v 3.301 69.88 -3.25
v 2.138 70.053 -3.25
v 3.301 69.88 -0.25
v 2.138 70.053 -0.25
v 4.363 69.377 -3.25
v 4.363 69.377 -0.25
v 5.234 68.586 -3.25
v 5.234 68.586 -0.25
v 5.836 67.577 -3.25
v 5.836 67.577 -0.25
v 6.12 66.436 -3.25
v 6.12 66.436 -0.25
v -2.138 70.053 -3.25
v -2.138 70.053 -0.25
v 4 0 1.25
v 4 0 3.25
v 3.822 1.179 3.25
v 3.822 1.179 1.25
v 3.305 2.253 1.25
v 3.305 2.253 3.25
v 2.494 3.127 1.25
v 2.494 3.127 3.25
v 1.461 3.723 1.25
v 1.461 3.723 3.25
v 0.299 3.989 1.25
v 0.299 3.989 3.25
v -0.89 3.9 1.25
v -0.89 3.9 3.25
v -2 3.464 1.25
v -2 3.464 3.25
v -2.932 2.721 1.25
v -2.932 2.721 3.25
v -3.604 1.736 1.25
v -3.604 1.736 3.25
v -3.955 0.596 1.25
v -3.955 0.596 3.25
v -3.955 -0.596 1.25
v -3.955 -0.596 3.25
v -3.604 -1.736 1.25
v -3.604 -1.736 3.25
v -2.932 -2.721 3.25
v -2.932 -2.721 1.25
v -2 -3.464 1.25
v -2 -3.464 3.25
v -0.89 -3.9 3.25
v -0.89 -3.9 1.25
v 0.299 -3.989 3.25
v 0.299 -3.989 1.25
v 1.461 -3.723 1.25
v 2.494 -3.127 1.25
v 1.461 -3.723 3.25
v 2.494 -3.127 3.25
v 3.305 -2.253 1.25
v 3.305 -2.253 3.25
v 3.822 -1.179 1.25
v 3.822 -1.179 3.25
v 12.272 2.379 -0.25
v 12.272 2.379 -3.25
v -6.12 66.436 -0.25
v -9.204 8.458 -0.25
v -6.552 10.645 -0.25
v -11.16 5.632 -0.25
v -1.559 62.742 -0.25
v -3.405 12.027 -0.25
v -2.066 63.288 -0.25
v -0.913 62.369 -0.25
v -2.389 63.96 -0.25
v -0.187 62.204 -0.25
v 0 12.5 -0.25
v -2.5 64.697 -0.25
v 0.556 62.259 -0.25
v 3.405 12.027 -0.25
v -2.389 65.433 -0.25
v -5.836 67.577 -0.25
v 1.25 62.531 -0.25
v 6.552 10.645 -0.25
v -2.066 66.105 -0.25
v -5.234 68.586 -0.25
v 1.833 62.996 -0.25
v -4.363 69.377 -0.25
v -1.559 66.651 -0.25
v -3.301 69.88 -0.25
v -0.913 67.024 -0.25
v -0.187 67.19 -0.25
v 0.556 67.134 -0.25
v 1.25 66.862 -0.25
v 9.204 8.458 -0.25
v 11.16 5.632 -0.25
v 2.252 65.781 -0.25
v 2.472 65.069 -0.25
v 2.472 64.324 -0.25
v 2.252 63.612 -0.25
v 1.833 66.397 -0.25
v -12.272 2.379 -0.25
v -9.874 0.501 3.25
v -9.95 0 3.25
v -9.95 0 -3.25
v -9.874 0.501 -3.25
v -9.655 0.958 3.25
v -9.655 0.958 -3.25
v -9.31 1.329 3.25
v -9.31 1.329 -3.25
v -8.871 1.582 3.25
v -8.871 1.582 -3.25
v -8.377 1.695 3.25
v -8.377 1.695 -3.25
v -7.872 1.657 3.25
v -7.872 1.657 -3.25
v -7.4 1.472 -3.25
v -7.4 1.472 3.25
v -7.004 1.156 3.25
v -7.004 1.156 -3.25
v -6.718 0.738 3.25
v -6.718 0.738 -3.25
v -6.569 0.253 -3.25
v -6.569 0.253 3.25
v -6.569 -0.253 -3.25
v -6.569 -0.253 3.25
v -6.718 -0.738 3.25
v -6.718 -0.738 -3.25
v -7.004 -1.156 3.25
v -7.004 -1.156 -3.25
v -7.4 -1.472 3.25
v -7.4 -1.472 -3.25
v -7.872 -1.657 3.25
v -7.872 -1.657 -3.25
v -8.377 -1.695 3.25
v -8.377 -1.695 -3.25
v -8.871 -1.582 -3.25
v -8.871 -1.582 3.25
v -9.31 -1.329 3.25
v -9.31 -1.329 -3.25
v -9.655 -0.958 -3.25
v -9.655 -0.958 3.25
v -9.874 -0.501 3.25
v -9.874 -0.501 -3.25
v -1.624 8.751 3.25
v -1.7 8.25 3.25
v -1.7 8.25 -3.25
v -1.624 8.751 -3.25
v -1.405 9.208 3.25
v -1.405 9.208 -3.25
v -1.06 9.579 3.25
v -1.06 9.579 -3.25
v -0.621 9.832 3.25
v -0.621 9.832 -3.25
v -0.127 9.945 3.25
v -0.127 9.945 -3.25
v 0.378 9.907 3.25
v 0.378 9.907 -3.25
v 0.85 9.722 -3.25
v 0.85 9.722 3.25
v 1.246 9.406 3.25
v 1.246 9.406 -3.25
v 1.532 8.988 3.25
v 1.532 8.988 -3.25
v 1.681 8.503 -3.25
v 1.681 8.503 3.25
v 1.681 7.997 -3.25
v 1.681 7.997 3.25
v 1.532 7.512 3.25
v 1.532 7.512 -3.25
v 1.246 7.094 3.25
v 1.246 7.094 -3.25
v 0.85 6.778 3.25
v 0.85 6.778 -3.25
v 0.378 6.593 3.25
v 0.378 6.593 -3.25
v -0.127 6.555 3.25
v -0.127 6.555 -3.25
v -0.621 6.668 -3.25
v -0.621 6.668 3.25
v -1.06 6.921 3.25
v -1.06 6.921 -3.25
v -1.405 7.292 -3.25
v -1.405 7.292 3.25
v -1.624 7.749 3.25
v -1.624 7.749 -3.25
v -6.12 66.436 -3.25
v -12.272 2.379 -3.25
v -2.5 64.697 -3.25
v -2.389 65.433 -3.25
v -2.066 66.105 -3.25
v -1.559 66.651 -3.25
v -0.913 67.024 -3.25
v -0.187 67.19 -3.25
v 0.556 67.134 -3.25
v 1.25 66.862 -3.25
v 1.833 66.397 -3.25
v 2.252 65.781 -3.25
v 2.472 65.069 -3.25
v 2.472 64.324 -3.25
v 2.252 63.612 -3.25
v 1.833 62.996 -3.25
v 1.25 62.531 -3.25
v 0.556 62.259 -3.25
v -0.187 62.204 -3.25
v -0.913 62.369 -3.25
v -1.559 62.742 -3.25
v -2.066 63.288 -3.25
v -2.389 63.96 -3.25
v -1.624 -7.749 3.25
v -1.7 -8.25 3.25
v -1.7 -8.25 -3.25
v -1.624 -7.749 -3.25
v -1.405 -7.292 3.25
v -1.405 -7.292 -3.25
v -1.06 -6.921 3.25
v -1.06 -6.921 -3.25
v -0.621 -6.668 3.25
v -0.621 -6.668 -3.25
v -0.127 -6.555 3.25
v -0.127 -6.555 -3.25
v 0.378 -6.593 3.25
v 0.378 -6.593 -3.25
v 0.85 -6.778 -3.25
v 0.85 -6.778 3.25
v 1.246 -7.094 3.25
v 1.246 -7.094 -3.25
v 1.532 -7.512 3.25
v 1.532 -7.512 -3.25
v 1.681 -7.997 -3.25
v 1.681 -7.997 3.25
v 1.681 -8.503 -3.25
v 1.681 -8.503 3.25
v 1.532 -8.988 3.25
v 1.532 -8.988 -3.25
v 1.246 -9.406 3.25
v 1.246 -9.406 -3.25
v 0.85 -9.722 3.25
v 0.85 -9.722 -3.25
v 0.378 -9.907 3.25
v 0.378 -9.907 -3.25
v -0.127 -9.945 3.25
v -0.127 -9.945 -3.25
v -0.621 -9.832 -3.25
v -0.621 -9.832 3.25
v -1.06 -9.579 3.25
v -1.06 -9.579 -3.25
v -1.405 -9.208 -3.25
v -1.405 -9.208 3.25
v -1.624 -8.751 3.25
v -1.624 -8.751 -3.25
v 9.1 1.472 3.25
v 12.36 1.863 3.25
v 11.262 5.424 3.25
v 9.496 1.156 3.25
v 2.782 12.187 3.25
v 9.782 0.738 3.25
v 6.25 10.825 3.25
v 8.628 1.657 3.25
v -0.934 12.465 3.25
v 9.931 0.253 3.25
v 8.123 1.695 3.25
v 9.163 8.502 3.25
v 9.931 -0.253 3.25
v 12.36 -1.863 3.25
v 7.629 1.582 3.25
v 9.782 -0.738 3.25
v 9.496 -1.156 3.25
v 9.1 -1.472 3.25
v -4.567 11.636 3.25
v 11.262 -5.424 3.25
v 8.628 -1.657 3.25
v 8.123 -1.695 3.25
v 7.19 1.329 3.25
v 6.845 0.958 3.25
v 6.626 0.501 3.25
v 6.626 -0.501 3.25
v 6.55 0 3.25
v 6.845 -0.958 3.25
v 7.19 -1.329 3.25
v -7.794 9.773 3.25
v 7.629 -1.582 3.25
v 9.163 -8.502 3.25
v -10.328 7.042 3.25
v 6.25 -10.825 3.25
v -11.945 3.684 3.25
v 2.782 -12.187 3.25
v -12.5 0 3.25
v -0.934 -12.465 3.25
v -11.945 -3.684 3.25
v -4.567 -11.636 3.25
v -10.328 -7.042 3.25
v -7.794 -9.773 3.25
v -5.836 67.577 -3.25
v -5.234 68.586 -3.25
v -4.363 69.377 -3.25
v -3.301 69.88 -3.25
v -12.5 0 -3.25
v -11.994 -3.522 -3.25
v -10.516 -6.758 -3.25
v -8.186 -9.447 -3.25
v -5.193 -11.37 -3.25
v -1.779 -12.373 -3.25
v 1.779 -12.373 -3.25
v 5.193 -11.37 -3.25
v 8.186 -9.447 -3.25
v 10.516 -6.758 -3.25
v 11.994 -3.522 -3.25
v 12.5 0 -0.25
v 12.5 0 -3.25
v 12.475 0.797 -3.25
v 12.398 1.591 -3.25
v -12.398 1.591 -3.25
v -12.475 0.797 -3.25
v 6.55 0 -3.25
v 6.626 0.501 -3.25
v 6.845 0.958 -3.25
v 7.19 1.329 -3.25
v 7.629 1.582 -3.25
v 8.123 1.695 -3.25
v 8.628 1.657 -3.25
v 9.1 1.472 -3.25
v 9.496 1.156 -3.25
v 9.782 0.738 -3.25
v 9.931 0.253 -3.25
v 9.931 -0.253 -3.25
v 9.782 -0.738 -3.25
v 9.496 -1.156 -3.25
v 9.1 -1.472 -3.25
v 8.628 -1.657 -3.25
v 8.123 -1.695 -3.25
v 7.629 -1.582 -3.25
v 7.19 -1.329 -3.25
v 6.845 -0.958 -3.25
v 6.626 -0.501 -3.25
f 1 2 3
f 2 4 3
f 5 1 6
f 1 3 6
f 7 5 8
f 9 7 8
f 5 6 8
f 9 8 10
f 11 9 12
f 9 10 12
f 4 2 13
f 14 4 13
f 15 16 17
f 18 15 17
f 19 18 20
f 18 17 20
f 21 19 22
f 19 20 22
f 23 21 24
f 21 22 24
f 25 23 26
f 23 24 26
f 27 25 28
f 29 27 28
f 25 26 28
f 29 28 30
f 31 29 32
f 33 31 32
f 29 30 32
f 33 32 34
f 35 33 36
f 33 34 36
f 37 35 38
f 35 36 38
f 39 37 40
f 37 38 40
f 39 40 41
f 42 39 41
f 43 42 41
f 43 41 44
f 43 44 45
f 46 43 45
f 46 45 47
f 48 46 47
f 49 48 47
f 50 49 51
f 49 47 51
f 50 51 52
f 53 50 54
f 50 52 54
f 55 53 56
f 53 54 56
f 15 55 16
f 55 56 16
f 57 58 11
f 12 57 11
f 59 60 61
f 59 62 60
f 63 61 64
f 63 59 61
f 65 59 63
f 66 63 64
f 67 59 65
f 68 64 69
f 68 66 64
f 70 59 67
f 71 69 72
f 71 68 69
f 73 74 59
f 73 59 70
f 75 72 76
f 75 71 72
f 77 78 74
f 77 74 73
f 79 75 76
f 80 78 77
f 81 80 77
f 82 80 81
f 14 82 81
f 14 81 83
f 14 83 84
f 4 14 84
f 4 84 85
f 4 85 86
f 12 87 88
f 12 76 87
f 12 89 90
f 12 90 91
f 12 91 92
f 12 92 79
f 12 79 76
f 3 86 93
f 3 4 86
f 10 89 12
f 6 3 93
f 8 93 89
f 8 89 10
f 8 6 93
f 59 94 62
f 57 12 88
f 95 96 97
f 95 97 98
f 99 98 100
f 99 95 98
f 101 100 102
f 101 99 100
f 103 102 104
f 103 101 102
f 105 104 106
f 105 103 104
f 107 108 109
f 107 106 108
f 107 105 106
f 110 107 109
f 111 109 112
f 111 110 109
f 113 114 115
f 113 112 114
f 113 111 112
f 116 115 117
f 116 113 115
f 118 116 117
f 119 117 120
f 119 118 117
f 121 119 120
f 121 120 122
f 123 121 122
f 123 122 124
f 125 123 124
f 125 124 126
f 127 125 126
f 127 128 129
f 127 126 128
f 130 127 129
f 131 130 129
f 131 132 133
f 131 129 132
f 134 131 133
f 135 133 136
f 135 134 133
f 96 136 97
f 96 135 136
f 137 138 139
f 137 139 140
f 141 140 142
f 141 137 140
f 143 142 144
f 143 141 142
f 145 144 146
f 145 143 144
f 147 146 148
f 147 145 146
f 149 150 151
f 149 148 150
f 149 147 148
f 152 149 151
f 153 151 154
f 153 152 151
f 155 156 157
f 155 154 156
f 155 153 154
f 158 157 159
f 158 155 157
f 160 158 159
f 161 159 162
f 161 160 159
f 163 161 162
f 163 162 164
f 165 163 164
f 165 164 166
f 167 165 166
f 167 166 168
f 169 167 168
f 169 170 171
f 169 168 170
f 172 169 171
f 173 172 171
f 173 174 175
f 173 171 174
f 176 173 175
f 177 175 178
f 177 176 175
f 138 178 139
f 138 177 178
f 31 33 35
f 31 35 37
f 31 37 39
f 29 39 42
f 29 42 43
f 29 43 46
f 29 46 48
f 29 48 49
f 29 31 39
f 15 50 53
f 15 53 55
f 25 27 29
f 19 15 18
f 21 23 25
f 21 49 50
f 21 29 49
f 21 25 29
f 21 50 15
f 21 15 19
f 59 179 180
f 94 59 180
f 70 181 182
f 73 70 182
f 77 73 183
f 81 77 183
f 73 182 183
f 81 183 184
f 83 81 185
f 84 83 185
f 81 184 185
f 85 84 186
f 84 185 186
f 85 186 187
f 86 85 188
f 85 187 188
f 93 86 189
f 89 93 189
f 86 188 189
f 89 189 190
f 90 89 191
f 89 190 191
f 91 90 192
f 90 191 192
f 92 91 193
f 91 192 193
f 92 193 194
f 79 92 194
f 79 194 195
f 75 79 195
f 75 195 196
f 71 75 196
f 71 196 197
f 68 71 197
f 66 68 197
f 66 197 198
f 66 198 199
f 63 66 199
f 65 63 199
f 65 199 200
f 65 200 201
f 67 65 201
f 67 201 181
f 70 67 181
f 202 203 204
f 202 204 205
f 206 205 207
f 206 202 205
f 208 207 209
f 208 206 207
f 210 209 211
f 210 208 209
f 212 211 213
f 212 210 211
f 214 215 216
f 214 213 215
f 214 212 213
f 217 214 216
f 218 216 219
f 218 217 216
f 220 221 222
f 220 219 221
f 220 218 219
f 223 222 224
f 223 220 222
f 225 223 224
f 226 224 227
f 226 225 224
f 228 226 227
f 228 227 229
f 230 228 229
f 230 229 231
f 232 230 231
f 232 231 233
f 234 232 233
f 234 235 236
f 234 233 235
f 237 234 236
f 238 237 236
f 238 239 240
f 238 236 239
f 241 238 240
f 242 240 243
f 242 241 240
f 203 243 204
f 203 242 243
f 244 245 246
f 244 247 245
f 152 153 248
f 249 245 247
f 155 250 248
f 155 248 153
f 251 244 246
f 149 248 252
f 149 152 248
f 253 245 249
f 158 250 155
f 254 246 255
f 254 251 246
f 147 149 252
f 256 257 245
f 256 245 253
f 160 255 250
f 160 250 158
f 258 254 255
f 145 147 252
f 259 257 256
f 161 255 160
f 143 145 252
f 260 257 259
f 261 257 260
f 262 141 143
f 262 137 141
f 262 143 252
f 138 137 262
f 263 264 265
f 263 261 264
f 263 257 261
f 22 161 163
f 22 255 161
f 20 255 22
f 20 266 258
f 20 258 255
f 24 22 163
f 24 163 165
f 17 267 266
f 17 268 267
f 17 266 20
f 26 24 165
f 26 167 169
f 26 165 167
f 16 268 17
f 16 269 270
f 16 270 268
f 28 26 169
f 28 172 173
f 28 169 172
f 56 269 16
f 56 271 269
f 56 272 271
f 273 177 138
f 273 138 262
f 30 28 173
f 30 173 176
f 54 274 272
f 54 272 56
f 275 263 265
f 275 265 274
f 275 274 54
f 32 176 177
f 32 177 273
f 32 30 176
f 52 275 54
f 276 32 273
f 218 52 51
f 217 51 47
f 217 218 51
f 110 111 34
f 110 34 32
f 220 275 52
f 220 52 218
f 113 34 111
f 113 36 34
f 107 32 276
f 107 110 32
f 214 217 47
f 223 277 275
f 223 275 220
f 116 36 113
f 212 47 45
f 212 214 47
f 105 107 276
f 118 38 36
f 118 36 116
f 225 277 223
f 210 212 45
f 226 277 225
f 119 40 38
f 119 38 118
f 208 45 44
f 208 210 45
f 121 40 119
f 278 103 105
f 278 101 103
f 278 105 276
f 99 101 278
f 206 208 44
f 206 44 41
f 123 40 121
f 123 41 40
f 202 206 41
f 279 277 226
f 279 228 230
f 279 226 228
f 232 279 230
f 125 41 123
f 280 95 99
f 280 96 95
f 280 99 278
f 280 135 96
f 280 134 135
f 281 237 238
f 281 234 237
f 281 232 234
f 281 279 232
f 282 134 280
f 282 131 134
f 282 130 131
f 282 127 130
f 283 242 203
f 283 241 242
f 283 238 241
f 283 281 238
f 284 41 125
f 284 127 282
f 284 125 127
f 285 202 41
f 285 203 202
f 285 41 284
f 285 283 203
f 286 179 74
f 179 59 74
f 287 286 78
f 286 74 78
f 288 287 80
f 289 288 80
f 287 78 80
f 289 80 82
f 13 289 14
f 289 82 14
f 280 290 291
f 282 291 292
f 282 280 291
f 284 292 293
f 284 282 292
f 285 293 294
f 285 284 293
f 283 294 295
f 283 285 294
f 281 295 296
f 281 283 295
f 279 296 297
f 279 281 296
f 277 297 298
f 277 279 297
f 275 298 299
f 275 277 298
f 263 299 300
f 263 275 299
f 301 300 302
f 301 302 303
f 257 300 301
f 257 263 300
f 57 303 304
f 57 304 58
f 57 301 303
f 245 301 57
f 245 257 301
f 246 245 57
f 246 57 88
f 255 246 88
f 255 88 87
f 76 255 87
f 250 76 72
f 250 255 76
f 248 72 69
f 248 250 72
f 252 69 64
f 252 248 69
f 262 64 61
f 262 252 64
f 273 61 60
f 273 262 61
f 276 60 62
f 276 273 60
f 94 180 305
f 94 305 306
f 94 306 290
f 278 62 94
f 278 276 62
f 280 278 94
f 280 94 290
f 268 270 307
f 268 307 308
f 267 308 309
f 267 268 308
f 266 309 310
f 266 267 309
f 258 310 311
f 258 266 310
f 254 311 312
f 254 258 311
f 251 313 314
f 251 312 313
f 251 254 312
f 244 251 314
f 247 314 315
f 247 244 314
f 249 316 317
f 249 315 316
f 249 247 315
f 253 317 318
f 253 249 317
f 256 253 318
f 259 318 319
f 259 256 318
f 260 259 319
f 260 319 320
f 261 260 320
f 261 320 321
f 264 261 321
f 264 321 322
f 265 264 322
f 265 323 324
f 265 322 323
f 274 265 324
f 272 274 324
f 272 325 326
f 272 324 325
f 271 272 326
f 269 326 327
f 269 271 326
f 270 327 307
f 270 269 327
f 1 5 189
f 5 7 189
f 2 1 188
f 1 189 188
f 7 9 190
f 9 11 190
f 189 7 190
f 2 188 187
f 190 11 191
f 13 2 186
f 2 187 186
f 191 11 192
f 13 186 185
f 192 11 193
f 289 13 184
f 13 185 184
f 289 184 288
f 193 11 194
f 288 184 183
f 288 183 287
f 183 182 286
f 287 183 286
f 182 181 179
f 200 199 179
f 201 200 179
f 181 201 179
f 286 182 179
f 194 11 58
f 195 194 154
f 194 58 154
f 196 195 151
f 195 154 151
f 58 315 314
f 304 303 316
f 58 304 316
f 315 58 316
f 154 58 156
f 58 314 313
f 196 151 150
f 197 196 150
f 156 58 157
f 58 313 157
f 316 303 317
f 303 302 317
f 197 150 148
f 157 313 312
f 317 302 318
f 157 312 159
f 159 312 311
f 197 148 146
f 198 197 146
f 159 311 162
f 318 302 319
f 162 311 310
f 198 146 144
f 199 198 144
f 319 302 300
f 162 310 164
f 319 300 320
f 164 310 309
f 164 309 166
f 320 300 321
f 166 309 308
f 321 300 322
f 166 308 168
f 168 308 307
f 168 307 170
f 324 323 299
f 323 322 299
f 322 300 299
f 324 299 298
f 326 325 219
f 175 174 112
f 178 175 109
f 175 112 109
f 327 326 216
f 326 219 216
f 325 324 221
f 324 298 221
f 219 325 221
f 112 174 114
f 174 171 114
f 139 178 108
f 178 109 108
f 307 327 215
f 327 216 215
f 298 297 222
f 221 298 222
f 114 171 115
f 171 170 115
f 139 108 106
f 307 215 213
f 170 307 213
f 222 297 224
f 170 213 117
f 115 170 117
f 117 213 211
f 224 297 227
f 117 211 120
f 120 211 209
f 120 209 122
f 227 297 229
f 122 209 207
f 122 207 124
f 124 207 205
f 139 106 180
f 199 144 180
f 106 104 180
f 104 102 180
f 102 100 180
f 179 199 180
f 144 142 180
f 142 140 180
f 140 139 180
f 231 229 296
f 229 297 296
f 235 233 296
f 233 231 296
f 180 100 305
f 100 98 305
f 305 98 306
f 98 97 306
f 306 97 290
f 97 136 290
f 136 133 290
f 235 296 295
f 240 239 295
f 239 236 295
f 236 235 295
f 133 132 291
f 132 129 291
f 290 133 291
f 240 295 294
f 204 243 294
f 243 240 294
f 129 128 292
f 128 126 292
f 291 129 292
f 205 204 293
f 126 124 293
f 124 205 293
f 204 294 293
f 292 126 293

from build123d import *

# Parameters (mm, degrees)
ESQUISSE2_R                  = 12.5
BOSS_EXTRU_1_DEPTH           = 3.25
ESQUISSE3_R                  = 1.2
ENL_V_MAT_EXTRU_1_DEPTH      = 18.973939468
BOSS_EXTRU_2_DEPTH           = 3
ENL_V_MAT_EXTRU_2_DEPTH      = 72.455982989
ENL_V_MAT_EXTRU_2_DEPTH_BACK = 72.455982989
ESQUISSE10_R                 = 1.7
ESQUISSE17_R                 = 4
ENL_V_MAT_EXTRU_8_DEPTH      = 2
CONG_1_R                     = 4
ESQUISSE21_R                 = 2.5
ENL_V_MAT_EXTRU_9_DEPTH      = 72.455982989


with BuildPart() as part:
    # Esquisse2 → Boss.-Extru.1 (new, symmetric)
    with BuildSketch(Plane.XY):
        with Locations(Location((0, 0, 0), (0, 0, 180))):
            Circle(ESQUISSE2_R)
    extrude(amount=BOSS_EXTRU_1_DEPTH, both=True)

    # Esquisse3 → Enlèv. mat.-Extru.1 (cut, through all)
    with BuildSketch(Plane.XY):
        with Locations(Location((0, 8.25, 0), (0, 0, 180))):
            Circle(ESQUISSE3_R)
        with Locations(Location((-8.25, 0, 0), (0, 0, 180))):
            Circle(ESQUISSE3_R)
        with Locations(Location((0, -8.25, 0), (0, 0, 180))):
            Circle(ESQUISSE3_R)
        with Locations(Location((8.25, 0, 0), (0, 0, 180))):
            Circle(ESQUISSE3_R)
    extrude(amount=ENL_V_MAT_EXTRU_1_DEPTH, mode=Mode.SUBTRACT)

    # Esquisse20 → Boss.-Extru.2 (add)
    with BuildSketch(Plane(origin=(0, 0, -3.25), x_dir=(-1, 0, 0), z_dir=(0, 0, -1))):
        Polygon((-12.5, 0), (-5.772196938, 70.05324764), (5.772196938, 70.05324764), (12.5, 0), align=None)
    extrude(amount=-BOSS_EXTRU_2_DEPTH)

    # Esquisse10 → Enlèv. mat.-Extru.2 (cut, two sides: drawn at the far end of the back side and taken through both)
    with BuildSketch(Plane(origin=(0, 0, -3.25), x_dir=(-1, 0, 0), z_dir=(0, 0, -1)).offset(-ENL_V_MAT_EXTRU_2_DEPTH_BACK)):
        with Locations((-8.25, 0)):
            Circle(ESQUISSE10_R)
        with Locations((0, 8.25)):
            Circle(ESQUISSE10_R)
        with Locations((8.25, 0)):
            Circle(ESQUISSE10_R)
        with Locations((0, -8.25)):
            Circle(ESQUISSE10_R)
    extrude(amount=ENL_V_MAT_EXTRU_2_DEPTH + ENL_V_MAT_EXTRU_2_DEPTH_BACK, mode=Mode.SUBTRACT)

    # Esquisse17 → Enlèv. mat.-Extru.8 (cut)
    with BuildSketch(Plane.XY.offset(3.25)):
        Circle(ESQUISSE17_R)
    extrude(amount=-ENL_V_MAT_EXTRU_8_DEPTH, mode=Mode.SUBTRACT)

    # Congé1
    cong_1_edges = [part.edges().sort_by_distance(p)[0] for p in [
        (-5.772196938, 70.05324764, -1.75),
        (5.772196938, 70.05324764, -1.75),
    ]]
    fillet(cong_1_edges, radius=CONG_1_R)

    # Esquisse21 → Enlèv. mat.-Extru.9 (cut, through all)
    with BuildSketch(Plane(origin=(0, 0, -3.25), x_dir=(-1, 0, 0), z_dir=(0, 0, -1))):
        with Locations((0, 64.696529063)):
            Circle(ESQUISSE21_R)
    extrude(amount=-ENL_V_MAT_EXTRU_9_DEPTH, mode=Mode.SUBTRACT)


solid = part.part
